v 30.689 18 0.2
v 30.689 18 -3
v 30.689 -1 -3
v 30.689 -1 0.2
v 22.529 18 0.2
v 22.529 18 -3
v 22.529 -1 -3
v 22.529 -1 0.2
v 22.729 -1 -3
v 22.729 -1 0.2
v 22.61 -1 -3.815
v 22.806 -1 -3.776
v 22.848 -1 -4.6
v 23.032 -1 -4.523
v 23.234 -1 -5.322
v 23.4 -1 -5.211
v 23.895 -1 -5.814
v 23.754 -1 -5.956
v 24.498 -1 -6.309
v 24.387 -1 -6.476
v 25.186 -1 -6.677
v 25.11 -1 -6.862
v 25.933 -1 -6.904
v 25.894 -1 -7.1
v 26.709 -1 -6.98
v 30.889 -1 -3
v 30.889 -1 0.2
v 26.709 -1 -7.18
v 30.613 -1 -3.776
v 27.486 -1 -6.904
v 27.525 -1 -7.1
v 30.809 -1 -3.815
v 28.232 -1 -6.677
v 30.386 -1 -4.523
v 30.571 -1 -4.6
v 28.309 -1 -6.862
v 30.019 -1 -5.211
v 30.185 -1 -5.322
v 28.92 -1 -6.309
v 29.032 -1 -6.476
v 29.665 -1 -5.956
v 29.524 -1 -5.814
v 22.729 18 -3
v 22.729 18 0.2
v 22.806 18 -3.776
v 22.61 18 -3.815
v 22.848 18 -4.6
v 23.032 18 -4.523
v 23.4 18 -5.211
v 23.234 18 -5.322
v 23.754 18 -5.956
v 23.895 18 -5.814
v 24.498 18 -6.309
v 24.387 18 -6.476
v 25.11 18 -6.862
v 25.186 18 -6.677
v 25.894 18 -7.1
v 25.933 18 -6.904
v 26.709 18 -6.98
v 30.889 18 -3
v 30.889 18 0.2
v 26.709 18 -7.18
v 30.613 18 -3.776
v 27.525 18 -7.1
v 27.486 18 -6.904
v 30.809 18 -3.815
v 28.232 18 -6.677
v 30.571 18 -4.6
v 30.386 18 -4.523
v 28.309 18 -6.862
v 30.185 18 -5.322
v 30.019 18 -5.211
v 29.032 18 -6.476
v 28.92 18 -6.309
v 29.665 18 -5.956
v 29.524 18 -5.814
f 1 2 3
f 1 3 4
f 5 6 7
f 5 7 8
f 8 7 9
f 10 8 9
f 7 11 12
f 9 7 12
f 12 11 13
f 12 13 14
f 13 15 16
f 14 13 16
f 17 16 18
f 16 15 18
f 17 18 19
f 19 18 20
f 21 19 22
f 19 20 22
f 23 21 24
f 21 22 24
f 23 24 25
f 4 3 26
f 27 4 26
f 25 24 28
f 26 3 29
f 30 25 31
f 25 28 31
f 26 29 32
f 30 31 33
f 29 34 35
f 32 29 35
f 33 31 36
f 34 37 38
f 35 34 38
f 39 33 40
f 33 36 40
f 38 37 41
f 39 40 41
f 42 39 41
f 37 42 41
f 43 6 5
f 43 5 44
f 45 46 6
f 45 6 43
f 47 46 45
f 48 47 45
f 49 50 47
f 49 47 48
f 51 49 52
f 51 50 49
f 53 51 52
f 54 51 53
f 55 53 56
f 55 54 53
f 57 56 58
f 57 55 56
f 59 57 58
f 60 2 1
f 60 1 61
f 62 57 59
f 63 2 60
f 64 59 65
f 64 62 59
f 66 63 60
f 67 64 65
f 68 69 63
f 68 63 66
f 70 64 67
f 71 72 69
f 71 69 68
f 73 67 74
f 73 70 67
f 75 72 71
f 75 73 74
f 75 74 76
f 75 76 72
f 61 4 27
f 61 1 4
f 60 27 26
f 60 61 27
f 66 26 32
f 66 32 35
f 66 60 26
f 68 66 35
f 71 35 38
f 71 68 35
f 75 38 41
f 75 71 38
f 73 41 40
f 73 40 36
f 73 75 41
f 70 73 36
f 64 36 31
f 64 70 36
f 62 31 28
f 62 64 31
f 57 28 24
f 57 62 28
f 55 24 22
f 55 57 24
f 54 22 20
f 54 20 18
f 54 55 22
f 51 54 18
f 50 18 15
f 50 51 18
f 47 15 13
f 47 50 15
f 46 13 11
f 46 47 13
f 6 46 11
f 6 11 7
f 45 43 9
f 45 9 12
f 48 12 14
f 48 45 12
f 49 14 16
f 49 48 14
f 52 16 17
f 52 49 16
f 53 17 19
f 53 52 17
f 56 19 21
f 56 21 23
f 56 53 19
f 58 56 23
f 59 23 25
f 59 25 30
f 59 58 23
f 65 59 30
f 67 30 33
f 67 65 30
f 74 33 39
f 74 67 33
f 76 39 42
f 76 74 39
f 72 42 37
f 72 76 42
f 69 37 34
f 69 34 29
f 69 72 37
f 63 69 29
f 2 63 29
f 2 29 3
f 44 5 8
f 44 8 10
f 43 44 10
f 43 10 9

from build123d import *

# Parameters (mm, degrees)
BOSS_EXTRUDE1_DEPTH = 18
BOSS_EXTRUDE2_START = -1
BOSS_EXTRUDE2_DEPTH = 1


with BuildPart() as part:
    # Sketch1 → Boss-Extrude1 (new body)
    with BuildSketch(Plane(origin=(0, 0, 0), x_dir=(1, 0, 0), z_dir=(0, 1, 0))):
        with BuildLine():
            ThreePointArc((30.88932948, 3), (26.70932948, 7.18), (22.52932948, 3))
            Line((22.52932948, 3), (22.52932948, 0))
            Line((22.52932948, 0), (22.52932948, -0.2))
            Line((22.52932948, -0.2), (22.72932948, -0.2))
            Line((22.72932948, -0.2), (22.72932948, 0))
            Line((22.72932948, 0), (22.72932948, 3))
            ThreePointArc((22.72932948, 3), (26.70932948, 6.98), (30.68932948, 3))
            Line((30.68932948, 3), (30.68932948, 0))
            Line((30.68932948, 0), (30.68932948, -0.2))
            Line((30.68932948, -0.2), (30.88932948, -0.2))
            Line((30.88932948, -0.2), (30.88932948, 0))
            Line((30.88932948, 0), (30.88932948, 3))
        make_face()
    extrude(amount=BOSS_EXTRUDE1_DEPTH)

    # Sketch1<4> → Boss-Extrude2 (add)
    with BuildSketch(Plane(origin=(0, 0, 0), x_dir=(1, 0, 0), z_dir=(0, 1, 0)).offset(BOSS_EXTRUDE2_START)):
        with BuildLine():
            ThreePointArc((30.88932948, 3), (26.70932948, 7.18), (22.52932948, 3))
            Line((22.52932948, 3), (22.52932948, 0))
            Line((22.52932948, 0), (22.52932948, -0.2))
            Line((22.52932948, -0.2), (22.72932948, -0.2))
            Line((22.72932948, -0.2), (22.72932948, 0))
            Line((22.72932948, 0), (22.72932948, 3))
            ThreePointArc((22.72932948, 3), (26.70932948, 6.98), (30.68932948, 3))
            Line((30.68932948, 3), (30.68932948, 0))
            Line((30.68932948, 0), (30.68932948, -0.2))
            Line((30.68932948, -0.2), (30.88932948, -0.2))
            Line((30.88932948, -0.2), (30.88932948, 0))
            Line((30.88932948, 0), (30.88932948, 3))
        make_face()
    extrude(amount=BOSS_EXTRUDE2_DEPTH)


solid = part.part
